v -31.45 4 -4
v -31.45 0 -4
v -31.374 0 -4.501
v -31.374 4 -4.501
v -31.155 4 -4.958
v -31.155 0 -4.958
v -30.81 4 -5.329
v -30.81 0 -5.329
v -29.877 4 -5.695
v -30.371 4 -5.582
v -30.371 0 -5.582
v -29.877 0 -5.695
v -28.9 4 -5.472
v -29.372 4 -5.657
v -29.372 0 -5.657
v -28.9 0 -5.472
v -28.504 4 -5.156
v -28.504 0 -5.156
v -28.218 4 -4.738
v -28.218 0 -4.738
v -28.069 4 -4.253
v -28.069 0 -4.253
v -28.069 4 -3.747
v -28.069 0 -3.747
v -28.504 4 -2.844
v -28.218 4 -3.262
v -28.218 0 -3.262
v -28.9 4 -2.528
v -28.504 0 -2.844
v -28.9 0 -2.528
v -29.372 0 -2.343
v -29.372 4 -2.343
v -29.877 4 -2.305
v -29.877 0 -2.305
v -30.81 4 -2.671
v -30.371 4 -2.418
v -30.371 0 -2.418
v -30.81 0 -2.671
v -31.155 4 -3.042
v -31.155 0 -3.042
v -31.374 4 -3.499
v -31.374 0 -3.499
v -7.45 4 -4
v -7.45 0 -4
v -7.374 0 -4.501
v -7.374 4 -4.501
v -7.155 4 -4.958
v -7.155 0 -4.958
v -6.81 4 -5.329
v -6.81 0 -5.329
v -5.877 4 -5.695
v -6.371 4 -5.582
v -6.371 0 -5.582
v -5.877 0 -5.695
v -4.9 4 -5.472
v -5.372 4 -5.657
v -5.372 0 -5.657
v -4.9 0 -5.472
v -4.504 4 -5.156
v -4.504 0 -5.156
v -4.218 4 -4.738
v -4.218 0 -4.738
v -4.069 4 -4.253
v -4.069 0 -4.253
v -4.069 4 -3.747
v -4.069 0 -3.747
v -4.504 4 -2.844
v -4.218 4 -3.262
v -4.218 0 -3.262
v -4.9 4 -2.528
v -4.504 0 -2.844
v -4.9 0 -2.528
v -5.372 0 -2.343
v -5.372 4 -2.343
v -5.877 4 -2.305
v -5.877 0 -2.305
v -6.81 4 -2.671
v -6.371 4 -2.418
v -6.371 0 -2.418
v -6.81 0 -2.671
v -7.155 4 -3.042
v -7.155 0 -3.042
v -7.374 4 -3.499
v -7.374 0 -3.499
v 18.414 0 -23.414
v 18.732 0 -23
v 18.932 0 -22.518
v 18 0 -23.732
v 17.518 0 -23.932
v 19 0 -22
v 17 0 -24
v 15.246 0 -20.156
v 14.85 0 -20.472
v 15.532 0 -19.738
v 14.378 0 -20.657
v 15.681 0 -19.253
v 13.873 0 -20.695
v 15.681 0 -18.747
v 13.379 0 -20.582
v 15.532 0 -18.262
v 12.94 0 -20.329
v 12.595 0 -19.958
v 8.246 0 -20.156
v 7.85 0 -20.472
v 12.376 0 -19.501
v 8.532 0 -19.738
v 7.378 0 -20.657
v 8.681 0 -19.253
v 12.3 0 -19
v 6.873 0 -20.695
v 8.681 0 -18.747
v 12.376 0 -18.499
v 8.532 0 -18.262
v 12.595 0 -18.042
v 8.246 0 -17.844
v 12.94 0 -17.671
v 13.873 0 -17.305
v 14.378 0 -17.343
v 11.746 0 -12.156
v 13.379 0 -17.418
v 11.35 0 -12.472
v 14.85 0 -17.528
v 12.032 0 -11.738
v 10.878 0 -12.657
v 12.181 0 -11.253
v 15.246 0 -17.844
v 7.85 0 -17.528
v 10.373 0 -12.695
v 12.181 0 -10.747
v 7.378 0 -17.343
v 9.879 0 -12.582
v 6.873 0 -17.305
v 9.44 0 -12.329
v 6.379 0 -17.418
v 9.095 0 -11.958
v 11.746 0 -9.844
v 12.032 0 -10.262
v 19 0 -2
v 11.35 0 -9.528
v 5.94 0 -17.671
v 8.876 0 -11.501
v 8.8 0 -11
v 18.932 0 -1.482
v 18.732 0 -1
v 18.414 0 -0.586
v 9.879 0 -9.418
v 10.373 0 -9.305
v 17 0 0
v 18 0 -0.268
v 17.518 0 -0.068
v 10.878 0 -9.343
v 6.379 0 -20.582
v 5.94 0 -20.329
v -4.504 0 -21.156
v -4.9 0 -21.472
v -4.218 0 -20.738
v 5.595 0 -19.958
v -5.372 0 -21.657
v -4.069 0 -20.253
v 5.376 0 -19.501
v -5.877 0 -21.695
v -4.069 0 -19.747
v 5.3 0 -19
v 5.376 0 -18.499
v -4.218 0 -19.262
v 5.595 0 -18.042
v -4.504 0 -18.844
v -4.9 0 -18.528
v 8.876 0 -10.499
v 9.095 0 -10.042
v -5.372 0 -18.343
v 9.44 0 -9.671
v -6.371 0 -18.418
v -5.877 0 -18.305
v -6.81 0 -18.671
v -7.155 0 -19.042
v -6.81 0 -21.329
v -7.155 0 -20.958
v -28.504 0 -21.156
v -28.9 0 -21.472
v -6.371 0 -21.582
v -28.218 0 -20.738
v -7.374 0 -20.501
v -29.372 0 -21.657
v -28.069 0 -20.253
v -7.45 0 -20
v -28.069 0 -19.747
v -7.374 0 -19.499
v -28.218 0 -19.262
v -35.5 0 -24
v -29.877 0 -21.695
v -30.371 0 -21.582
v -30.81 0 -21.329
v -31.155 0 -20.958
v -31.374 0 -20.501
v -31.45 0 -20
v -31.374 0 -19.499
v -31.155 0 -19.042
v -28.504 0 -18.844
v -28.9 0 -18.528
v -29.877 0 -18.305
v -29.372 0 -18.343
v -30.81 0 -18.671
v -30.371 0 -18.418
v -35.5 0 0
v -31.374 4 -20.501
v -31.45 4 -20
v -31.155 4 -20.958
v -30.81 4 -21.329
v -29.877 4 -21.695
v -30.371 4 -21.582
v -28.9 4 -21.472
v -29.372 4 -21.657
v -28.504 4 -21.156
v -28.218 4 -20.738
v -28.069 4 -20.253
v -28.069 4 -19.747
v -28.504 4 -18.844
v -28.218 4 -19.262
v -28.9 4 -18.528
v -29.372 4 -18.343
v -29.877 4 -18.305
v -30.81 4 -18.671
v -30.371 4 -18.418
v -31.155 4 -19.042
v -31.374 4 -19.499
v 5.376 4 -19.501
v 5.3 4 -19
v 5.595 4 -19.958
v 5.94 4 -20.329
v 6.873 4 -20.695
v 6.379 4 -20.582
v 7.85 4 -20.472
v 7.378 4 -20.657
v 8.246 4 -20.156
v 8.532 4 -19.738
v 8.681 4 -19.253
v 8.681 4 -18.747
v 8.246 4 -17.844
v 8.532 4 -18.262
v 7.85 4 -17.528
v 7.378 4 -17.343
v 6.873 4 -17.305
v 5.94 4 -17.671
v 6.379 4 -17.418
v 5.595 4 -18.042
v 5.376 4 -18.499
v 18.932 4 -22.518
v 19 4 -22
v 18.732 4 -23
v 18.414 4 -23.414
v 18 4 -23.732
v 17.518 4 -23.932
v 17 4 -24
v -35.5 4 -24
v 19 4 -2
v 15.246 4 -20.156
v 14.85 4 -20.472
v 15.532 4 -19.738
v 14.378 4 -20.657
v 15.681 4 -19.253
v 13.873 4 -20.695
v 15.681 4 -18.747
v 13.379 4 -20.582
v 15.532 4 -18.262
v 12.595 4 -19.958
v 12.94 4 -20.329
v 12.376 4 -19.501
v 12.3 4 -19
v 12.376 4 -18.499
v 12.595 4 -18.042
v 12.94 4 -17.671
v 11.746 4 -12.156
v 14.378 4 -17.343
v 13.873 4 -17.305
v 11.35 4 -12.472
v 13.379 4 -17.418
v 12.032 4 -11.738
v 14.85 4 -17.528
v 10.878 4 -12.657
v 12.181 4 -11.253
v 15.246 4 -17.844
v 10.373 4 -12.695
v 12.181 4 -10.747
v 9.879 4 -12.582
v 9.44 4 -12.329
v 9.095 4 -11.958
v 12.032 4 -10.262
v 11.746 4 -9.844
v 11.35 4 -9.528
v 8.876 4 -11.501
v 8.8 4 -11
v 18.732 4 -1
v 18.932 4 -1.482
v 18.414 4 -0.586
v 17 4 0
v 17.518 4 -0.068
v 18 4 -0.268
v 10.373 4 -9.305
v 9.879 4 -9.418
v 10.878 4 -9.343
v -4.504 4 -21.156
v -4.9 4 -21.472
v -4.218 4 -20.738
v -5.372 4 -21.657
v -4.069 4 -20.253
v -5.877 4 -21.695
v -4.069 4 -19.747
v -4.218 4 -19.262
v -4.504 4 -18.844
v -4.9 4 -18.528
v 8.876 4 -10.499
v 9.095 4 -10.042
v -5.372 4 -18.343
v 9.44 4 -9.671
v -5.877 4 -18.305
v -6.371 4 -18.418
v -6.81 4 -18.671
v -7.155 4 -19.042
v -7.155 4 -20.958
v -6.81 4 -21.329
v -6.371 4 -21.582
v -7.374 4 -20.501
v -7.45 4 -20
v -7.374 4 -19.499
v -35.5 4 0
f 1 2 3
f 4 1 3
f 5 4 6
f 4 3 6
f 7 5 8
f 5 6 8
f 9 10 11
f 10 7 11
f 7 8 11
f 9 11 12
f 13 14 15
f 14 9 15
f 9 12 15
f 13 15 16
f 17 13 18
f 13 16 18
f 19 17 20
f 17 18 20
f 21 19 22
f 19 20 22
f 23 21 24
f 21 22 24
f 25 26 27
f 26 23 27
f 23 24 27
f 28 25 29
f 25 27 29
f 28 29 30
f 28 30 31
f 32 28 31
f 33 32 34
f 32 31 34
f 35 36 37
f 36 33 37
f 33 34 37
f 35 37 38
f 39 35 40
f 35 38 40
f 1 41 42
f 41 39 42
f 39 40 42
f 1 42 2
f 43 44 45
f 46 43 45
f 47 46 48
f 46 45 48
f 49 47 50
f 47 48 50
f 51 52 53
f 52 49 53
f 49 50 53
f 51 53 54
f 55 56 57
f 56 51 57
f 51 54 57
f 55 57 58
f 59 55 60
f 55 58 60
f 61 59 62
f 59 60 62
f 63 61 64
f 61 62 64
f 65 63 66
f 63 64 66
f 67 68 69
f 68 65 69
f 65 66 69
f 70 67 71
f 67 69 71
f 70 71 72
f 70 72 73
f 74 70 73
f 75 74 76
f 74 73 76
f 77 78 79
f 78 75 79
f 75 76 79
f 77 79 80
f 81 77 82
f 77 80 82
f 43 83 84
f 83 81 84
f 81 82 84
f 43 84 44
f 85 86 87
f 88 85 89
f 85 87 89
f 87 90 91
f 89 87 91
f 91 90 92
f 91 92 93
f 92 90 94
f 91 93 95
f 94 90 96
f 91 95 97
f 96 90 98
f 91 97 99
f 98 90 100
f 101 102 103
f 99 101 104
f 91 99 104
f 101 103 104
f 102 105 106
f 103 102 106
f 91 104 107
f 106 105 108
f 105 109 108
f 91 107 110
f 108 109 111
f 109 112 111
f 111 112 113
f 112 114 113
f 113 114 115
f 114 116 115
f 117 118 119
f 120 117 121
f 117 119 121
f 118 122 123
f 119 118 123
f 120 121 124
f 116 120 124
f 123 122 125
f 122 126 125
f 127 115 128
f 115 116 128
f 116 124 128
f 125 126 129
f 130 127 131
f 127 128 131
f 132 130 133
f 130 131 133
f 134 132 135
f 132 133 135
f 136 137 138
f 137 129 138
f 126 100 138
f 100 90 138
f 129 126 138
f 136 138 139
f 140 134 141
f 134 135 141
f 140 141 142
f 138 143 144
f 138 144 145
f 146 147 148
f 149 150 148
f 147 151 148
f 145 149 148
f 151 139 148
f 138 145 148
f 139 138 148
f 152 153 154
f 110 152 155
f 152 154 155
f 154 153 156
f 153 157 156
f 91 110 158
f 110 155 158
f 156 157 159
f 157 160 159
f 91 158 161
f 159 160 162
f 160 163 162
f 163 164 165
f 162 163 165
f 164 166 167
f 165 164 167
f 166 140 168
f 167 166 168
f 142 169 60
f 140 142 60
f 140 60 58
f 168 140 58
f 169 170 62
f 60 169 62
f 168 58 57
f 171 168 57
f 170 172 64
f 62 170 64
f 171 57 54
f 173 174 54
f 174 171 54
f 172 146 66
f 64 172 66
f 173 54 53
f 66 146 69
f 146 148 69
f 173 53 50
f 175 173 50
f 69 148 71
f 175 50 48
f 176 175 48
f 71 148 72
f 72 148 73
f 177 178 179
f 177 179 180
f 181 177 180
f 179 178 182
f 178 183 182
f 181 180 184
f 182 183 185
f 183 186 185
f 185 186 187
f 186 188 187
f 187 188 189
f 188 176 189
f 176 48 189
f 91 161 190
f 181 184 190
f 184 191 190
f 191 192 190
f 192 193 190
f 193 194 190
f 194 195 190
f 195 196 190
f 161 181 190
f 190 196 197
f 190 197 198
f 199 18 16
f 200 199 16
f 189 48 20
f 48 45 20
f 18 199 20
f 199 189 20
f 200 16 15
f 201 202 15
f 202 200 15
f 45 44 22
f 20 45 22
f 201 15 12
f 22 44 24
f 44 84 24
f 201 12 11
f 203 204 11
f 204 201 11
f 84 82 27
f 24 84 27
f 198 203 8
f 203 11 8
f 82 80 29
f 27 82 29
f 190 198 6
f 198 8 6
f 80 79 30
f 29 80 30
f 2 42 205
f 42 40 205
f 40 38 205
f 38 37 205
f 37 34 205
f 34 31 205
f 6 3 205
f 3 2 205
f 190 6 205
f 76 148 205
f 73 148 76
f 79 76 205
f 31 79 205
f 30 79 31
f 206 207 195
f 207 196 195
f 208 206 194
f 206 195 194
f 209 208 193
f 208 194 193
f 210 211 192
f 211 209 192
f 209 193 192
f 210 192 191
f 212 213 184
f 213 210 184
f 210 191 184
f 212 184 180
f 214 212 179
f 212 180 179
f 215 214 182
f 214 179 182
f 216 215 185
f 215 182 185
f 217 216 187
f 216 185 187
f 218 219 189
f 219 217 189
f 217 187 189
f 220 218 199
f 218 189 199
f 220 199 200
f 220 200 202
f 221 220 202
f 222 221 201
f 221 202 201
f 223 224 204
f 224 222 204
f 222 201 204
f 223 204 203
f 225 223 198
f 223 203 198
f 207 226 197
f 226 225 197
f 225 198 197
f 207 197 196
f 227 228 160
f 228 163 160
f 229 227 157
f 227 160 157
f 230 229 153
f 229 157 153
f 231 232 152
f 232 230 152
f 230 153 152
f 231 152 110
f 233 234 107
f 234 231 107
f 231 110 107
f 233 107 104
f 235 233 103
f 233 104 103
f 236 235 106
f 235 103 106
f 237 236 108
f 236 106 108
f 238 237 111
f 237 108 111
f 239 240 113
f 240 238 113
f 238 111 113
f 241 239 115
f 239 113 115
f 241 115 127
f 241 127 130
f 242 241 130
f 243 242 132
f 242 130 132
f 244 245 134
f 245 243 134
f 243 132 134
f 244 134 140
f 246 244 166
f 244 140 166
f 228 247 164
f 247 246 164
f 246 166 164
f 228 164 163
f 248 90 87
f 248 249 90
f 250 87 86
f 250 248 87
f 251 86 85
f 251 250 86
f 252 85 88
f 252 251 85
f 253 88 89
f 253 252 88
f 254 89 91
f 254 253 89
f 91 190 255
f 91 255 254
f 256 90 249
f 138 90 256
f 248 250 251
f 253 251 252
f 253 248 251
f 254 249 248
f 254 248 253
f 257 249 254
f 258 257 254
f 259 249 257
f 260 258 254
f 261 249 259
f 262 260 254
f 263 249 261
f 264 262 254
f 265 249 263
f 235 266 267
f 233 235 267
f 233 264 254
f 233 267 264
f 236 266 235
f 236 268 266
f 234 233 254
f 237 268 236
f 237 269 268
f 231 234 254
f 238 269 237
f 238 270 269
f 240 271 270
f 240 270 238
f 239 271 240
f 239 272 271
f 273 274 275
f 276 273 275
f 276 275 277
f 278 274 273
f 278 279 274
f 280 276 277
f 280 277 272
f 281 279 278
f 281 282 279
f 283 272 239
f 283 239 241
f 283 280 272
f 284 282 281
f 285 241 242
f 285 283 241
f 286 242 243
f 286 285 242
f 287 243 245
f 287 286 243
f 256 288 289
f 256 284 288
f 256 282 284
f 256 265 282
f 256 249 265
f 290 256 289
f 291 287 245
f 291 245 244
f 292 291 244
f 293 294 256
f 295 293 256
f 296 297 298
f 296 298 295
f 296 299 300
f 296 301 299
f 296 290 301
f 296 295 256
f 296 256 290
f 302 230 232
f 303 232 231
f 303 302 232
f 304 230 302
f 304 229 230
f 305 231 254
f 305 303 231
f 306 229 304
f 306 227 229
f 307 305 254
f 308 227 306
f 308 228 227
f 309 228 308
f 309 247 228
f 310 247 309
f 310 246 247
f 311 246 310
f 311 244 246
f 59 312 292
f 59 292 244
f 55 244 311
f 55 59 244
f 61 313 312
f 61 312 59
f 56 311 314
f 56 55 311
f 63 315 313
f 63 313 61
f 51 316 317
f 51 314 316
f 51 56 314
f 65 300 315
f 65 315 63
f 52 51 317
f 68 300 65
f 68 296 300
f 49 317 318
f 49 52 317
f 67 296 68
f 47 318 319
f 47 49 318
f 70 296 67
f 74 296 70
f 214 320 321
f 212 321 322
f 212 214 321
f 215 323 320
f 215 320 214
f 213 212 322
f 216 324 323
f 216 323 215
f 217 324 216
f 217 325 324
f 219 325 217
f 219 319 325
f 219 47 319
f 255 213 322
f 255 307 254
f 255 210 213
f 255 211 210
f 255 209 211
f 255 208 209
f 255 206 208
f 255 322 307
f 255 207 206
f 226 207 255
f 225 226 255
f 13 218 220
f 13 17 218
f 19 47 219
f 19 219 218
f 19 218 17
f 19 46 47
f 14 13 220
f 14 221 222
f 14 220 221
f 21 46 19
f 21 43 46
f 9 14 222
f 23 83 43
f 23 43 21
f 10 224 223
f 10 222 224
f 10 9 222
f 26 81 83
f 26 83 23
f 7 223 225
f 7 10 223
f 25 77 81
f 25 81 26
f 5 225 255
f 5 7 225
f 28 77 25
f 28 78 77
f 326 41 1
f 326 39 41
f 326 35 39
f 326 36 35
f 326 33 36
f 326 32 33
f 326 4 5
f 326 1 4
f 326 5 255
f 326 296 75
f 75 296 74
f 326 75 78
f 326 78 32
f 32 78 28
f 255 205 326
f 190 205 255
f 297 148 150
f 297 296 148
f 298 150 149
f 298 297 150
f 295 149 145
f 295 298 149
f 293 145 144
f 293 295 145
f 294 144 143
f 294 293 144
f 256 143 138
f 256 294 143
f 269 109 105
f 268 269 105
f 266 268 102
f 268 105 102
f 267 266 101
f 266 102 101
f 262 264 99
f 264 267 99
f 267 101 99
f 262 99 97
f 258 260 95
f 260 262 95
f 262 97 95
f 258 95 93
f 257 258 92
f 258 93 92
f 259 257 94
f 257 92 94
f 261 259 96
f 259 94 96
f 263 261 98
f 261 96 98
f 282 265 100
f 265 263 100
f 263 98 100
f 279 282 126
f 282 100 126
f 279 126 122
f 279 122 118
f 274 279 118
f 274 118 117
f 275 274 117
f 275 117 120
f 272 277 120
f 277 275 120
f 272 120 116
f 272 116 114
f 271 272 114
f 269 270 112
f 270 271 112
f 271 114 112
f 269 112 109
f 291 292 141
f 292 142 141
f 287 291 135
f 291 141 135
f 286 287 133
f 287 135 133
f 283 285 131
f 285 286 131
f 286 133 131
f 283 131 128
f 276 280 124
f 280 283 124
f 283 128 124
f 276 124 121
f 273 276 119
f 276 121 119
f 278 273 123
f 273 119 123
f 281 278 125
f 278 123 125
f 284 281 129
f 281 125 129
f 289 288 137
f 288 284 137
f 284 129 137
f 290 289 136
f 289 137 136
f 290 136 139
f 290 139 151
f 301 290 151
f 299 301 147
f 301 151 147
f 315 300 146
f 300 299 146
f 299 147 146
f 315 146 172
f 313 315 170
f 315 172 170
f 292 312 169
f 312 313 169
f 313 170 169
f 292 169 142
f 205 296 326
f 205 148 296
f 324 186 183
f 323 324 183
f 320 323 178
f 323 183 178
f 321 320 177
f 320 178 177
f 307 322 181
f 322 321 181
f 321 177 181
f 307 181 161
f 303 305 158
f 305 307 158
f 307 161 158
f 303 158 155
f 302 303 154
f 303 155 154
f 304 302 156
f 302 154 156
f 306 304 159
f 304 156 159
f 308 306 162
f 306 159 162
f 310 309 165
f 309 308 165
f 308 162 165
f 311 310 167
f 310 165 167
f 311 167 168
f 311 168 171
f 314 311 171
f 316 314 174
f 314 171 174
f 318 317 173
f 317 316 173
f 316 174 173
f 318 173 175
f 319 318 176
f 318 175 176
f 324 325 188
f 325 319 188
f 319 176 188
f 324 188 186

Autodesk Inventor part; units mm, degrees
ref_plane "YZ Plane" through (0, 0, 0) normal (1, 0, 0) x (0, 1, 0)
ref_plane "XZ Plane" through (0, 0, 0) normal (0, 1, 0) x (-1, 0, 0)
ref_plane "XY Plane" through (0, 0, 0) normal (0, 0, 1) x (1, 0, 0)
sketch "Sketch1" plane through (0, 0, 0) normal (0, 1, 0) x (-1, 0, 0)
  line L0 (0, 0) -> (35.5, 0)
  line L1 (35.5, 0) -> (35.5, -24)
  line L2 (35.5, -24) -> (0, -24)
  line L3 (0, -24) -> (0, 0)
  circle A0 centre (5.75, -20) radius 1.7
  circle A1 centre (5.75, -4) radius 1.7
  circle A2 centre (29.75, -20) radius 1.7
  circle A3 centre (29.75, -4) radius 1.7
  line L4 (0, -24) -> (-19, -24)
  line L5 (-19, -24) -> (-19, 0)
  line L6 (-19, 0) -> (0, 0)
  line L7 (0, 0) -> (0, -24)
  circle A4 centre (-14, -19) radius 1.7
  circle A5 centre (-7, -19) radius 1.7
  circle A6 centre (-10.5, -11) radius 1.7
  line L8 (35.5, -24) -> (35.5, 0)
  dimension "d0" = 35.5
  dimension "d1" = 24
  dimension "d2" = 3.4
  dimension "d3" = 4
  dimension "d4" = 5.75
  dimension "d5" = 3.4
  dimension "d6" = 16
  dimension "d7" = 3.4
  dimension "d8" = 4
  dimension "d9" = 5.75
  dimension "d10" = 3.4
  dimension "d11" = 16
  dimension "d12" = 19
  dimension "d13" = 24
  dimension "d14" = 3.4
  dimension "d15" = 5
  dimension "d16" = 5
  dimension "d17" = 3.4
  dimension "d18" = 7
  dimension "d19" = 3.4
  dimension "d20" = 8
  dimension "d21" = 3.5
  dimension "d35" = 24
extrude "Extrusion1" add sketch "Sketch1" along normal blind 4
fillet "Fillet1" radius 2 2 edges at (19, 2, 0) (19, 2, -24)
properties part number "drag chain mount"
